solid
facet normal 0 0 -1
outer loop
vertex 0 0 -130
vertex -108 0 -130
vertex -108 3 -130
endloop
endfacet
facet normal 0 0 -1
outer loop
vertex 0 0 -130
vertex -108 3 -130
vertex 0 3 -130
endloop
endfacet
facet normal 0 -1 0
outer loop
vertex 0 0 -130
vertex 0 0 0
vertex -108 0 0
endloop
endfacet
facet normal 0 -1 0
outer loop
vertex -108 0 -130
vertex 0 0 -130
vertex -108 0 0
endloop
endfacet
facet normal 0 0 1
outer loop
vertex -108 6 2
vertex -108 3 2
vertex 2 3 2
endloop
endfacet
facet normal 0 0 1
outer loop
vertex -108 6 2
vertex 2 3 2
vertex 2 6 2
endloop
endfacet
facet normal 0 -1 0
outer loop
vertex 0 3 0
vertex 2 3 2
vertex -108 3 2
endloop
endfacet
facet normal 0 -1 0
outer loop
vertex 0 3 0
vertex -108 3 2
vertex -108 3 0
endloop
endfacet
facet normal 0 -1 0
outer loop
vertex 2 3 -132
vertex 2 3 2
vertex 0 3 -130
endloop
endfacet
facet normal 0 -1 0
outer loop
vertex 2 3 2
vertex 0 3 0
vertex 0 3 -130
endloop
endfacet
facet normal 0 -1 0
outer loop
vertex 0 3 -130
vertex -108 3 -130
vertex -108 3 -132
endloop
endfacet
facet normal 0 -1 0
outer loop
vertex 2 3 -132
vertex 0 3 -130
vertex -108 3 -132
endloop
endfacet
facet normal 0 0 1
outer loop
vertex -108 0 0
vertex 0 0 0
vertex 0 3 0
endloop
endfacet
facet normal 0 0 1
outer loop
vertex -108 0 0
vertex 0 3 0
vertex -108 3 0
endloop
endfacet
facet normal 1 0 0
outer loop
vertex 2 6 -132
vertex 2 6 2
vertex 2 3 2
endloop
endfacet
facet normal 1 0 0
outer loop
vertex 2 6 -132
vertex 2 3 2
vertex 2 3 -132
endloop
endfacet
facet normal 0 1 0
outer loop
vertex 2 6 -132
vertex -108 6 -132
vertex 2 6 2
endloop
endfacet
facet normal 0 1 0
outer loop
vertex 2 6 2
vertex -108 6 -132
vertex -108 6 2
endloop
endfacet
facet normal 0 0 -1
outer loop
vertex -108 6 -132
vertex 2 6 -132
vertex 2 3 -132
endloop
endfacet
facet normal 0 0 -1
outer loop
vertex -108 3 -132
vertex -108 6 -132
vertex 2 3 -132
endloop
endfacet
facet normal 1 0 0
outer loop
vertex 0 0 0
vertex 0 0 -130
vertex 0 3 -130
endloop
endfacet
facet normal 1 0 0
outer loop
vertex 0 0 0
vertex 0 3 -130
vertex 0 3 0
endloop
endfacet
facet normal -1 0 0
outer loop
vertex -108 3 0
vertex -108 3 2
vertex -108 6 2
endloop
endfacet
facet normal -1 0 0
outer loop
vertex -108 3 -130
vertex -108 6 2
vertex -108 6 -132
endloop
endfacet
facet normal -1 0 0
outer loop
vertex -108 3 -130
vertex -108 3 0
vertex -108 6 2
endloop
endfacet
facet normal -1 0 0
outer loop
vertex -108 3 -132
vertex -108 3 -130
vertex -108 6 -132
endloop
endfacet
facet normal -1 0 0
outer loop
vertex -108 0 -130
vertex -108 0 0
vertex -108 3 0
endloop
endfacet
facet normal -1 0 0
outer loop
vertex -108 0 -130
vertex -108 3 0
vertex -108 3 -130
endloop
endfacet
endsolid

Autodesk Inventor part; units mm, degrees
ref_plane "YZ Plane" through (0, 0, 0) normal (1, 0, 0) x (0, 1, 0)
ref_plane "XZ Plane" through (0, 0, 0) normal (0, 1, 0) x (-1, 0, 0)
ref_plane "XY Plane" through (0, 0, 0) normal (0, 0, 1) x (1, 0, 0)
sketch "Sketch5" plane through (0, 0, 0) normal (0, 1, 0) x (-1, 0, 0)
  line L0 (0, 0) -> (108, 0)
  line L1 (108, 0) -> (108, -130)
  line L2 (108, -130) -> (0, -130)
  line L3 (0, -130) -> (0, 0)
  dimension "d16" = 108
  dimension "d17" = 130
extrude "Extrusion4" add sketch "Sketch5" along normal blind 6
sketch "Sketch7" plane through (-108, 0, 0) normal (0, 0, 1) x (1, 0, 0)
  line L0 (0, 0) -> (108, 0) projected
  line L1 (108, 0) -> (108, 6) projected
  line L2 (0, 6) -> (108, 6) projected
  line L3 (0, 0) -> (0, 6) projected
  line L4 (108, 6) -> (0, 6)
  line L5 (0, 6) -> (0, 3)
  line L6 (108, 4) -> (108, 6)
  line L7 (108, 3) -> (0, 3)
  dimension "d35" = 3
extrude "Extrusion6" add sketch "Sketch7" along normal blind 2 and the other way blind 132 contours L3 L2 L1 L7
sketch "Sketch8" plane through (0, 0, 0) normal (1, 0, 0) x (0, 0, -1)
  line L0 (0, 0) -> (0, 3) projected
  line L1 (0, 0) -> (130, 0) projected
  line L2 (130, 0) -> (130, 3) projected
  line L3 (130, 3) -> (132, 3) projected
  line L4 (132, 6) -> (-2, 6) projected
  line L5 (-2, 3) -> (-2, 6) projected
  line L6 (0, 3) -> (130, 3)
  line L7 (132, 6) -> (132, 3) projected
  line L8 (-2, 3) -> (0, 3) projected
extrude "Extrusion7" add sketch "Sketch8" along normal blind 2 contours L8 L5 L4 L7 L3 L6
properties part number "TAPITA LA REAL AHORA SI"
